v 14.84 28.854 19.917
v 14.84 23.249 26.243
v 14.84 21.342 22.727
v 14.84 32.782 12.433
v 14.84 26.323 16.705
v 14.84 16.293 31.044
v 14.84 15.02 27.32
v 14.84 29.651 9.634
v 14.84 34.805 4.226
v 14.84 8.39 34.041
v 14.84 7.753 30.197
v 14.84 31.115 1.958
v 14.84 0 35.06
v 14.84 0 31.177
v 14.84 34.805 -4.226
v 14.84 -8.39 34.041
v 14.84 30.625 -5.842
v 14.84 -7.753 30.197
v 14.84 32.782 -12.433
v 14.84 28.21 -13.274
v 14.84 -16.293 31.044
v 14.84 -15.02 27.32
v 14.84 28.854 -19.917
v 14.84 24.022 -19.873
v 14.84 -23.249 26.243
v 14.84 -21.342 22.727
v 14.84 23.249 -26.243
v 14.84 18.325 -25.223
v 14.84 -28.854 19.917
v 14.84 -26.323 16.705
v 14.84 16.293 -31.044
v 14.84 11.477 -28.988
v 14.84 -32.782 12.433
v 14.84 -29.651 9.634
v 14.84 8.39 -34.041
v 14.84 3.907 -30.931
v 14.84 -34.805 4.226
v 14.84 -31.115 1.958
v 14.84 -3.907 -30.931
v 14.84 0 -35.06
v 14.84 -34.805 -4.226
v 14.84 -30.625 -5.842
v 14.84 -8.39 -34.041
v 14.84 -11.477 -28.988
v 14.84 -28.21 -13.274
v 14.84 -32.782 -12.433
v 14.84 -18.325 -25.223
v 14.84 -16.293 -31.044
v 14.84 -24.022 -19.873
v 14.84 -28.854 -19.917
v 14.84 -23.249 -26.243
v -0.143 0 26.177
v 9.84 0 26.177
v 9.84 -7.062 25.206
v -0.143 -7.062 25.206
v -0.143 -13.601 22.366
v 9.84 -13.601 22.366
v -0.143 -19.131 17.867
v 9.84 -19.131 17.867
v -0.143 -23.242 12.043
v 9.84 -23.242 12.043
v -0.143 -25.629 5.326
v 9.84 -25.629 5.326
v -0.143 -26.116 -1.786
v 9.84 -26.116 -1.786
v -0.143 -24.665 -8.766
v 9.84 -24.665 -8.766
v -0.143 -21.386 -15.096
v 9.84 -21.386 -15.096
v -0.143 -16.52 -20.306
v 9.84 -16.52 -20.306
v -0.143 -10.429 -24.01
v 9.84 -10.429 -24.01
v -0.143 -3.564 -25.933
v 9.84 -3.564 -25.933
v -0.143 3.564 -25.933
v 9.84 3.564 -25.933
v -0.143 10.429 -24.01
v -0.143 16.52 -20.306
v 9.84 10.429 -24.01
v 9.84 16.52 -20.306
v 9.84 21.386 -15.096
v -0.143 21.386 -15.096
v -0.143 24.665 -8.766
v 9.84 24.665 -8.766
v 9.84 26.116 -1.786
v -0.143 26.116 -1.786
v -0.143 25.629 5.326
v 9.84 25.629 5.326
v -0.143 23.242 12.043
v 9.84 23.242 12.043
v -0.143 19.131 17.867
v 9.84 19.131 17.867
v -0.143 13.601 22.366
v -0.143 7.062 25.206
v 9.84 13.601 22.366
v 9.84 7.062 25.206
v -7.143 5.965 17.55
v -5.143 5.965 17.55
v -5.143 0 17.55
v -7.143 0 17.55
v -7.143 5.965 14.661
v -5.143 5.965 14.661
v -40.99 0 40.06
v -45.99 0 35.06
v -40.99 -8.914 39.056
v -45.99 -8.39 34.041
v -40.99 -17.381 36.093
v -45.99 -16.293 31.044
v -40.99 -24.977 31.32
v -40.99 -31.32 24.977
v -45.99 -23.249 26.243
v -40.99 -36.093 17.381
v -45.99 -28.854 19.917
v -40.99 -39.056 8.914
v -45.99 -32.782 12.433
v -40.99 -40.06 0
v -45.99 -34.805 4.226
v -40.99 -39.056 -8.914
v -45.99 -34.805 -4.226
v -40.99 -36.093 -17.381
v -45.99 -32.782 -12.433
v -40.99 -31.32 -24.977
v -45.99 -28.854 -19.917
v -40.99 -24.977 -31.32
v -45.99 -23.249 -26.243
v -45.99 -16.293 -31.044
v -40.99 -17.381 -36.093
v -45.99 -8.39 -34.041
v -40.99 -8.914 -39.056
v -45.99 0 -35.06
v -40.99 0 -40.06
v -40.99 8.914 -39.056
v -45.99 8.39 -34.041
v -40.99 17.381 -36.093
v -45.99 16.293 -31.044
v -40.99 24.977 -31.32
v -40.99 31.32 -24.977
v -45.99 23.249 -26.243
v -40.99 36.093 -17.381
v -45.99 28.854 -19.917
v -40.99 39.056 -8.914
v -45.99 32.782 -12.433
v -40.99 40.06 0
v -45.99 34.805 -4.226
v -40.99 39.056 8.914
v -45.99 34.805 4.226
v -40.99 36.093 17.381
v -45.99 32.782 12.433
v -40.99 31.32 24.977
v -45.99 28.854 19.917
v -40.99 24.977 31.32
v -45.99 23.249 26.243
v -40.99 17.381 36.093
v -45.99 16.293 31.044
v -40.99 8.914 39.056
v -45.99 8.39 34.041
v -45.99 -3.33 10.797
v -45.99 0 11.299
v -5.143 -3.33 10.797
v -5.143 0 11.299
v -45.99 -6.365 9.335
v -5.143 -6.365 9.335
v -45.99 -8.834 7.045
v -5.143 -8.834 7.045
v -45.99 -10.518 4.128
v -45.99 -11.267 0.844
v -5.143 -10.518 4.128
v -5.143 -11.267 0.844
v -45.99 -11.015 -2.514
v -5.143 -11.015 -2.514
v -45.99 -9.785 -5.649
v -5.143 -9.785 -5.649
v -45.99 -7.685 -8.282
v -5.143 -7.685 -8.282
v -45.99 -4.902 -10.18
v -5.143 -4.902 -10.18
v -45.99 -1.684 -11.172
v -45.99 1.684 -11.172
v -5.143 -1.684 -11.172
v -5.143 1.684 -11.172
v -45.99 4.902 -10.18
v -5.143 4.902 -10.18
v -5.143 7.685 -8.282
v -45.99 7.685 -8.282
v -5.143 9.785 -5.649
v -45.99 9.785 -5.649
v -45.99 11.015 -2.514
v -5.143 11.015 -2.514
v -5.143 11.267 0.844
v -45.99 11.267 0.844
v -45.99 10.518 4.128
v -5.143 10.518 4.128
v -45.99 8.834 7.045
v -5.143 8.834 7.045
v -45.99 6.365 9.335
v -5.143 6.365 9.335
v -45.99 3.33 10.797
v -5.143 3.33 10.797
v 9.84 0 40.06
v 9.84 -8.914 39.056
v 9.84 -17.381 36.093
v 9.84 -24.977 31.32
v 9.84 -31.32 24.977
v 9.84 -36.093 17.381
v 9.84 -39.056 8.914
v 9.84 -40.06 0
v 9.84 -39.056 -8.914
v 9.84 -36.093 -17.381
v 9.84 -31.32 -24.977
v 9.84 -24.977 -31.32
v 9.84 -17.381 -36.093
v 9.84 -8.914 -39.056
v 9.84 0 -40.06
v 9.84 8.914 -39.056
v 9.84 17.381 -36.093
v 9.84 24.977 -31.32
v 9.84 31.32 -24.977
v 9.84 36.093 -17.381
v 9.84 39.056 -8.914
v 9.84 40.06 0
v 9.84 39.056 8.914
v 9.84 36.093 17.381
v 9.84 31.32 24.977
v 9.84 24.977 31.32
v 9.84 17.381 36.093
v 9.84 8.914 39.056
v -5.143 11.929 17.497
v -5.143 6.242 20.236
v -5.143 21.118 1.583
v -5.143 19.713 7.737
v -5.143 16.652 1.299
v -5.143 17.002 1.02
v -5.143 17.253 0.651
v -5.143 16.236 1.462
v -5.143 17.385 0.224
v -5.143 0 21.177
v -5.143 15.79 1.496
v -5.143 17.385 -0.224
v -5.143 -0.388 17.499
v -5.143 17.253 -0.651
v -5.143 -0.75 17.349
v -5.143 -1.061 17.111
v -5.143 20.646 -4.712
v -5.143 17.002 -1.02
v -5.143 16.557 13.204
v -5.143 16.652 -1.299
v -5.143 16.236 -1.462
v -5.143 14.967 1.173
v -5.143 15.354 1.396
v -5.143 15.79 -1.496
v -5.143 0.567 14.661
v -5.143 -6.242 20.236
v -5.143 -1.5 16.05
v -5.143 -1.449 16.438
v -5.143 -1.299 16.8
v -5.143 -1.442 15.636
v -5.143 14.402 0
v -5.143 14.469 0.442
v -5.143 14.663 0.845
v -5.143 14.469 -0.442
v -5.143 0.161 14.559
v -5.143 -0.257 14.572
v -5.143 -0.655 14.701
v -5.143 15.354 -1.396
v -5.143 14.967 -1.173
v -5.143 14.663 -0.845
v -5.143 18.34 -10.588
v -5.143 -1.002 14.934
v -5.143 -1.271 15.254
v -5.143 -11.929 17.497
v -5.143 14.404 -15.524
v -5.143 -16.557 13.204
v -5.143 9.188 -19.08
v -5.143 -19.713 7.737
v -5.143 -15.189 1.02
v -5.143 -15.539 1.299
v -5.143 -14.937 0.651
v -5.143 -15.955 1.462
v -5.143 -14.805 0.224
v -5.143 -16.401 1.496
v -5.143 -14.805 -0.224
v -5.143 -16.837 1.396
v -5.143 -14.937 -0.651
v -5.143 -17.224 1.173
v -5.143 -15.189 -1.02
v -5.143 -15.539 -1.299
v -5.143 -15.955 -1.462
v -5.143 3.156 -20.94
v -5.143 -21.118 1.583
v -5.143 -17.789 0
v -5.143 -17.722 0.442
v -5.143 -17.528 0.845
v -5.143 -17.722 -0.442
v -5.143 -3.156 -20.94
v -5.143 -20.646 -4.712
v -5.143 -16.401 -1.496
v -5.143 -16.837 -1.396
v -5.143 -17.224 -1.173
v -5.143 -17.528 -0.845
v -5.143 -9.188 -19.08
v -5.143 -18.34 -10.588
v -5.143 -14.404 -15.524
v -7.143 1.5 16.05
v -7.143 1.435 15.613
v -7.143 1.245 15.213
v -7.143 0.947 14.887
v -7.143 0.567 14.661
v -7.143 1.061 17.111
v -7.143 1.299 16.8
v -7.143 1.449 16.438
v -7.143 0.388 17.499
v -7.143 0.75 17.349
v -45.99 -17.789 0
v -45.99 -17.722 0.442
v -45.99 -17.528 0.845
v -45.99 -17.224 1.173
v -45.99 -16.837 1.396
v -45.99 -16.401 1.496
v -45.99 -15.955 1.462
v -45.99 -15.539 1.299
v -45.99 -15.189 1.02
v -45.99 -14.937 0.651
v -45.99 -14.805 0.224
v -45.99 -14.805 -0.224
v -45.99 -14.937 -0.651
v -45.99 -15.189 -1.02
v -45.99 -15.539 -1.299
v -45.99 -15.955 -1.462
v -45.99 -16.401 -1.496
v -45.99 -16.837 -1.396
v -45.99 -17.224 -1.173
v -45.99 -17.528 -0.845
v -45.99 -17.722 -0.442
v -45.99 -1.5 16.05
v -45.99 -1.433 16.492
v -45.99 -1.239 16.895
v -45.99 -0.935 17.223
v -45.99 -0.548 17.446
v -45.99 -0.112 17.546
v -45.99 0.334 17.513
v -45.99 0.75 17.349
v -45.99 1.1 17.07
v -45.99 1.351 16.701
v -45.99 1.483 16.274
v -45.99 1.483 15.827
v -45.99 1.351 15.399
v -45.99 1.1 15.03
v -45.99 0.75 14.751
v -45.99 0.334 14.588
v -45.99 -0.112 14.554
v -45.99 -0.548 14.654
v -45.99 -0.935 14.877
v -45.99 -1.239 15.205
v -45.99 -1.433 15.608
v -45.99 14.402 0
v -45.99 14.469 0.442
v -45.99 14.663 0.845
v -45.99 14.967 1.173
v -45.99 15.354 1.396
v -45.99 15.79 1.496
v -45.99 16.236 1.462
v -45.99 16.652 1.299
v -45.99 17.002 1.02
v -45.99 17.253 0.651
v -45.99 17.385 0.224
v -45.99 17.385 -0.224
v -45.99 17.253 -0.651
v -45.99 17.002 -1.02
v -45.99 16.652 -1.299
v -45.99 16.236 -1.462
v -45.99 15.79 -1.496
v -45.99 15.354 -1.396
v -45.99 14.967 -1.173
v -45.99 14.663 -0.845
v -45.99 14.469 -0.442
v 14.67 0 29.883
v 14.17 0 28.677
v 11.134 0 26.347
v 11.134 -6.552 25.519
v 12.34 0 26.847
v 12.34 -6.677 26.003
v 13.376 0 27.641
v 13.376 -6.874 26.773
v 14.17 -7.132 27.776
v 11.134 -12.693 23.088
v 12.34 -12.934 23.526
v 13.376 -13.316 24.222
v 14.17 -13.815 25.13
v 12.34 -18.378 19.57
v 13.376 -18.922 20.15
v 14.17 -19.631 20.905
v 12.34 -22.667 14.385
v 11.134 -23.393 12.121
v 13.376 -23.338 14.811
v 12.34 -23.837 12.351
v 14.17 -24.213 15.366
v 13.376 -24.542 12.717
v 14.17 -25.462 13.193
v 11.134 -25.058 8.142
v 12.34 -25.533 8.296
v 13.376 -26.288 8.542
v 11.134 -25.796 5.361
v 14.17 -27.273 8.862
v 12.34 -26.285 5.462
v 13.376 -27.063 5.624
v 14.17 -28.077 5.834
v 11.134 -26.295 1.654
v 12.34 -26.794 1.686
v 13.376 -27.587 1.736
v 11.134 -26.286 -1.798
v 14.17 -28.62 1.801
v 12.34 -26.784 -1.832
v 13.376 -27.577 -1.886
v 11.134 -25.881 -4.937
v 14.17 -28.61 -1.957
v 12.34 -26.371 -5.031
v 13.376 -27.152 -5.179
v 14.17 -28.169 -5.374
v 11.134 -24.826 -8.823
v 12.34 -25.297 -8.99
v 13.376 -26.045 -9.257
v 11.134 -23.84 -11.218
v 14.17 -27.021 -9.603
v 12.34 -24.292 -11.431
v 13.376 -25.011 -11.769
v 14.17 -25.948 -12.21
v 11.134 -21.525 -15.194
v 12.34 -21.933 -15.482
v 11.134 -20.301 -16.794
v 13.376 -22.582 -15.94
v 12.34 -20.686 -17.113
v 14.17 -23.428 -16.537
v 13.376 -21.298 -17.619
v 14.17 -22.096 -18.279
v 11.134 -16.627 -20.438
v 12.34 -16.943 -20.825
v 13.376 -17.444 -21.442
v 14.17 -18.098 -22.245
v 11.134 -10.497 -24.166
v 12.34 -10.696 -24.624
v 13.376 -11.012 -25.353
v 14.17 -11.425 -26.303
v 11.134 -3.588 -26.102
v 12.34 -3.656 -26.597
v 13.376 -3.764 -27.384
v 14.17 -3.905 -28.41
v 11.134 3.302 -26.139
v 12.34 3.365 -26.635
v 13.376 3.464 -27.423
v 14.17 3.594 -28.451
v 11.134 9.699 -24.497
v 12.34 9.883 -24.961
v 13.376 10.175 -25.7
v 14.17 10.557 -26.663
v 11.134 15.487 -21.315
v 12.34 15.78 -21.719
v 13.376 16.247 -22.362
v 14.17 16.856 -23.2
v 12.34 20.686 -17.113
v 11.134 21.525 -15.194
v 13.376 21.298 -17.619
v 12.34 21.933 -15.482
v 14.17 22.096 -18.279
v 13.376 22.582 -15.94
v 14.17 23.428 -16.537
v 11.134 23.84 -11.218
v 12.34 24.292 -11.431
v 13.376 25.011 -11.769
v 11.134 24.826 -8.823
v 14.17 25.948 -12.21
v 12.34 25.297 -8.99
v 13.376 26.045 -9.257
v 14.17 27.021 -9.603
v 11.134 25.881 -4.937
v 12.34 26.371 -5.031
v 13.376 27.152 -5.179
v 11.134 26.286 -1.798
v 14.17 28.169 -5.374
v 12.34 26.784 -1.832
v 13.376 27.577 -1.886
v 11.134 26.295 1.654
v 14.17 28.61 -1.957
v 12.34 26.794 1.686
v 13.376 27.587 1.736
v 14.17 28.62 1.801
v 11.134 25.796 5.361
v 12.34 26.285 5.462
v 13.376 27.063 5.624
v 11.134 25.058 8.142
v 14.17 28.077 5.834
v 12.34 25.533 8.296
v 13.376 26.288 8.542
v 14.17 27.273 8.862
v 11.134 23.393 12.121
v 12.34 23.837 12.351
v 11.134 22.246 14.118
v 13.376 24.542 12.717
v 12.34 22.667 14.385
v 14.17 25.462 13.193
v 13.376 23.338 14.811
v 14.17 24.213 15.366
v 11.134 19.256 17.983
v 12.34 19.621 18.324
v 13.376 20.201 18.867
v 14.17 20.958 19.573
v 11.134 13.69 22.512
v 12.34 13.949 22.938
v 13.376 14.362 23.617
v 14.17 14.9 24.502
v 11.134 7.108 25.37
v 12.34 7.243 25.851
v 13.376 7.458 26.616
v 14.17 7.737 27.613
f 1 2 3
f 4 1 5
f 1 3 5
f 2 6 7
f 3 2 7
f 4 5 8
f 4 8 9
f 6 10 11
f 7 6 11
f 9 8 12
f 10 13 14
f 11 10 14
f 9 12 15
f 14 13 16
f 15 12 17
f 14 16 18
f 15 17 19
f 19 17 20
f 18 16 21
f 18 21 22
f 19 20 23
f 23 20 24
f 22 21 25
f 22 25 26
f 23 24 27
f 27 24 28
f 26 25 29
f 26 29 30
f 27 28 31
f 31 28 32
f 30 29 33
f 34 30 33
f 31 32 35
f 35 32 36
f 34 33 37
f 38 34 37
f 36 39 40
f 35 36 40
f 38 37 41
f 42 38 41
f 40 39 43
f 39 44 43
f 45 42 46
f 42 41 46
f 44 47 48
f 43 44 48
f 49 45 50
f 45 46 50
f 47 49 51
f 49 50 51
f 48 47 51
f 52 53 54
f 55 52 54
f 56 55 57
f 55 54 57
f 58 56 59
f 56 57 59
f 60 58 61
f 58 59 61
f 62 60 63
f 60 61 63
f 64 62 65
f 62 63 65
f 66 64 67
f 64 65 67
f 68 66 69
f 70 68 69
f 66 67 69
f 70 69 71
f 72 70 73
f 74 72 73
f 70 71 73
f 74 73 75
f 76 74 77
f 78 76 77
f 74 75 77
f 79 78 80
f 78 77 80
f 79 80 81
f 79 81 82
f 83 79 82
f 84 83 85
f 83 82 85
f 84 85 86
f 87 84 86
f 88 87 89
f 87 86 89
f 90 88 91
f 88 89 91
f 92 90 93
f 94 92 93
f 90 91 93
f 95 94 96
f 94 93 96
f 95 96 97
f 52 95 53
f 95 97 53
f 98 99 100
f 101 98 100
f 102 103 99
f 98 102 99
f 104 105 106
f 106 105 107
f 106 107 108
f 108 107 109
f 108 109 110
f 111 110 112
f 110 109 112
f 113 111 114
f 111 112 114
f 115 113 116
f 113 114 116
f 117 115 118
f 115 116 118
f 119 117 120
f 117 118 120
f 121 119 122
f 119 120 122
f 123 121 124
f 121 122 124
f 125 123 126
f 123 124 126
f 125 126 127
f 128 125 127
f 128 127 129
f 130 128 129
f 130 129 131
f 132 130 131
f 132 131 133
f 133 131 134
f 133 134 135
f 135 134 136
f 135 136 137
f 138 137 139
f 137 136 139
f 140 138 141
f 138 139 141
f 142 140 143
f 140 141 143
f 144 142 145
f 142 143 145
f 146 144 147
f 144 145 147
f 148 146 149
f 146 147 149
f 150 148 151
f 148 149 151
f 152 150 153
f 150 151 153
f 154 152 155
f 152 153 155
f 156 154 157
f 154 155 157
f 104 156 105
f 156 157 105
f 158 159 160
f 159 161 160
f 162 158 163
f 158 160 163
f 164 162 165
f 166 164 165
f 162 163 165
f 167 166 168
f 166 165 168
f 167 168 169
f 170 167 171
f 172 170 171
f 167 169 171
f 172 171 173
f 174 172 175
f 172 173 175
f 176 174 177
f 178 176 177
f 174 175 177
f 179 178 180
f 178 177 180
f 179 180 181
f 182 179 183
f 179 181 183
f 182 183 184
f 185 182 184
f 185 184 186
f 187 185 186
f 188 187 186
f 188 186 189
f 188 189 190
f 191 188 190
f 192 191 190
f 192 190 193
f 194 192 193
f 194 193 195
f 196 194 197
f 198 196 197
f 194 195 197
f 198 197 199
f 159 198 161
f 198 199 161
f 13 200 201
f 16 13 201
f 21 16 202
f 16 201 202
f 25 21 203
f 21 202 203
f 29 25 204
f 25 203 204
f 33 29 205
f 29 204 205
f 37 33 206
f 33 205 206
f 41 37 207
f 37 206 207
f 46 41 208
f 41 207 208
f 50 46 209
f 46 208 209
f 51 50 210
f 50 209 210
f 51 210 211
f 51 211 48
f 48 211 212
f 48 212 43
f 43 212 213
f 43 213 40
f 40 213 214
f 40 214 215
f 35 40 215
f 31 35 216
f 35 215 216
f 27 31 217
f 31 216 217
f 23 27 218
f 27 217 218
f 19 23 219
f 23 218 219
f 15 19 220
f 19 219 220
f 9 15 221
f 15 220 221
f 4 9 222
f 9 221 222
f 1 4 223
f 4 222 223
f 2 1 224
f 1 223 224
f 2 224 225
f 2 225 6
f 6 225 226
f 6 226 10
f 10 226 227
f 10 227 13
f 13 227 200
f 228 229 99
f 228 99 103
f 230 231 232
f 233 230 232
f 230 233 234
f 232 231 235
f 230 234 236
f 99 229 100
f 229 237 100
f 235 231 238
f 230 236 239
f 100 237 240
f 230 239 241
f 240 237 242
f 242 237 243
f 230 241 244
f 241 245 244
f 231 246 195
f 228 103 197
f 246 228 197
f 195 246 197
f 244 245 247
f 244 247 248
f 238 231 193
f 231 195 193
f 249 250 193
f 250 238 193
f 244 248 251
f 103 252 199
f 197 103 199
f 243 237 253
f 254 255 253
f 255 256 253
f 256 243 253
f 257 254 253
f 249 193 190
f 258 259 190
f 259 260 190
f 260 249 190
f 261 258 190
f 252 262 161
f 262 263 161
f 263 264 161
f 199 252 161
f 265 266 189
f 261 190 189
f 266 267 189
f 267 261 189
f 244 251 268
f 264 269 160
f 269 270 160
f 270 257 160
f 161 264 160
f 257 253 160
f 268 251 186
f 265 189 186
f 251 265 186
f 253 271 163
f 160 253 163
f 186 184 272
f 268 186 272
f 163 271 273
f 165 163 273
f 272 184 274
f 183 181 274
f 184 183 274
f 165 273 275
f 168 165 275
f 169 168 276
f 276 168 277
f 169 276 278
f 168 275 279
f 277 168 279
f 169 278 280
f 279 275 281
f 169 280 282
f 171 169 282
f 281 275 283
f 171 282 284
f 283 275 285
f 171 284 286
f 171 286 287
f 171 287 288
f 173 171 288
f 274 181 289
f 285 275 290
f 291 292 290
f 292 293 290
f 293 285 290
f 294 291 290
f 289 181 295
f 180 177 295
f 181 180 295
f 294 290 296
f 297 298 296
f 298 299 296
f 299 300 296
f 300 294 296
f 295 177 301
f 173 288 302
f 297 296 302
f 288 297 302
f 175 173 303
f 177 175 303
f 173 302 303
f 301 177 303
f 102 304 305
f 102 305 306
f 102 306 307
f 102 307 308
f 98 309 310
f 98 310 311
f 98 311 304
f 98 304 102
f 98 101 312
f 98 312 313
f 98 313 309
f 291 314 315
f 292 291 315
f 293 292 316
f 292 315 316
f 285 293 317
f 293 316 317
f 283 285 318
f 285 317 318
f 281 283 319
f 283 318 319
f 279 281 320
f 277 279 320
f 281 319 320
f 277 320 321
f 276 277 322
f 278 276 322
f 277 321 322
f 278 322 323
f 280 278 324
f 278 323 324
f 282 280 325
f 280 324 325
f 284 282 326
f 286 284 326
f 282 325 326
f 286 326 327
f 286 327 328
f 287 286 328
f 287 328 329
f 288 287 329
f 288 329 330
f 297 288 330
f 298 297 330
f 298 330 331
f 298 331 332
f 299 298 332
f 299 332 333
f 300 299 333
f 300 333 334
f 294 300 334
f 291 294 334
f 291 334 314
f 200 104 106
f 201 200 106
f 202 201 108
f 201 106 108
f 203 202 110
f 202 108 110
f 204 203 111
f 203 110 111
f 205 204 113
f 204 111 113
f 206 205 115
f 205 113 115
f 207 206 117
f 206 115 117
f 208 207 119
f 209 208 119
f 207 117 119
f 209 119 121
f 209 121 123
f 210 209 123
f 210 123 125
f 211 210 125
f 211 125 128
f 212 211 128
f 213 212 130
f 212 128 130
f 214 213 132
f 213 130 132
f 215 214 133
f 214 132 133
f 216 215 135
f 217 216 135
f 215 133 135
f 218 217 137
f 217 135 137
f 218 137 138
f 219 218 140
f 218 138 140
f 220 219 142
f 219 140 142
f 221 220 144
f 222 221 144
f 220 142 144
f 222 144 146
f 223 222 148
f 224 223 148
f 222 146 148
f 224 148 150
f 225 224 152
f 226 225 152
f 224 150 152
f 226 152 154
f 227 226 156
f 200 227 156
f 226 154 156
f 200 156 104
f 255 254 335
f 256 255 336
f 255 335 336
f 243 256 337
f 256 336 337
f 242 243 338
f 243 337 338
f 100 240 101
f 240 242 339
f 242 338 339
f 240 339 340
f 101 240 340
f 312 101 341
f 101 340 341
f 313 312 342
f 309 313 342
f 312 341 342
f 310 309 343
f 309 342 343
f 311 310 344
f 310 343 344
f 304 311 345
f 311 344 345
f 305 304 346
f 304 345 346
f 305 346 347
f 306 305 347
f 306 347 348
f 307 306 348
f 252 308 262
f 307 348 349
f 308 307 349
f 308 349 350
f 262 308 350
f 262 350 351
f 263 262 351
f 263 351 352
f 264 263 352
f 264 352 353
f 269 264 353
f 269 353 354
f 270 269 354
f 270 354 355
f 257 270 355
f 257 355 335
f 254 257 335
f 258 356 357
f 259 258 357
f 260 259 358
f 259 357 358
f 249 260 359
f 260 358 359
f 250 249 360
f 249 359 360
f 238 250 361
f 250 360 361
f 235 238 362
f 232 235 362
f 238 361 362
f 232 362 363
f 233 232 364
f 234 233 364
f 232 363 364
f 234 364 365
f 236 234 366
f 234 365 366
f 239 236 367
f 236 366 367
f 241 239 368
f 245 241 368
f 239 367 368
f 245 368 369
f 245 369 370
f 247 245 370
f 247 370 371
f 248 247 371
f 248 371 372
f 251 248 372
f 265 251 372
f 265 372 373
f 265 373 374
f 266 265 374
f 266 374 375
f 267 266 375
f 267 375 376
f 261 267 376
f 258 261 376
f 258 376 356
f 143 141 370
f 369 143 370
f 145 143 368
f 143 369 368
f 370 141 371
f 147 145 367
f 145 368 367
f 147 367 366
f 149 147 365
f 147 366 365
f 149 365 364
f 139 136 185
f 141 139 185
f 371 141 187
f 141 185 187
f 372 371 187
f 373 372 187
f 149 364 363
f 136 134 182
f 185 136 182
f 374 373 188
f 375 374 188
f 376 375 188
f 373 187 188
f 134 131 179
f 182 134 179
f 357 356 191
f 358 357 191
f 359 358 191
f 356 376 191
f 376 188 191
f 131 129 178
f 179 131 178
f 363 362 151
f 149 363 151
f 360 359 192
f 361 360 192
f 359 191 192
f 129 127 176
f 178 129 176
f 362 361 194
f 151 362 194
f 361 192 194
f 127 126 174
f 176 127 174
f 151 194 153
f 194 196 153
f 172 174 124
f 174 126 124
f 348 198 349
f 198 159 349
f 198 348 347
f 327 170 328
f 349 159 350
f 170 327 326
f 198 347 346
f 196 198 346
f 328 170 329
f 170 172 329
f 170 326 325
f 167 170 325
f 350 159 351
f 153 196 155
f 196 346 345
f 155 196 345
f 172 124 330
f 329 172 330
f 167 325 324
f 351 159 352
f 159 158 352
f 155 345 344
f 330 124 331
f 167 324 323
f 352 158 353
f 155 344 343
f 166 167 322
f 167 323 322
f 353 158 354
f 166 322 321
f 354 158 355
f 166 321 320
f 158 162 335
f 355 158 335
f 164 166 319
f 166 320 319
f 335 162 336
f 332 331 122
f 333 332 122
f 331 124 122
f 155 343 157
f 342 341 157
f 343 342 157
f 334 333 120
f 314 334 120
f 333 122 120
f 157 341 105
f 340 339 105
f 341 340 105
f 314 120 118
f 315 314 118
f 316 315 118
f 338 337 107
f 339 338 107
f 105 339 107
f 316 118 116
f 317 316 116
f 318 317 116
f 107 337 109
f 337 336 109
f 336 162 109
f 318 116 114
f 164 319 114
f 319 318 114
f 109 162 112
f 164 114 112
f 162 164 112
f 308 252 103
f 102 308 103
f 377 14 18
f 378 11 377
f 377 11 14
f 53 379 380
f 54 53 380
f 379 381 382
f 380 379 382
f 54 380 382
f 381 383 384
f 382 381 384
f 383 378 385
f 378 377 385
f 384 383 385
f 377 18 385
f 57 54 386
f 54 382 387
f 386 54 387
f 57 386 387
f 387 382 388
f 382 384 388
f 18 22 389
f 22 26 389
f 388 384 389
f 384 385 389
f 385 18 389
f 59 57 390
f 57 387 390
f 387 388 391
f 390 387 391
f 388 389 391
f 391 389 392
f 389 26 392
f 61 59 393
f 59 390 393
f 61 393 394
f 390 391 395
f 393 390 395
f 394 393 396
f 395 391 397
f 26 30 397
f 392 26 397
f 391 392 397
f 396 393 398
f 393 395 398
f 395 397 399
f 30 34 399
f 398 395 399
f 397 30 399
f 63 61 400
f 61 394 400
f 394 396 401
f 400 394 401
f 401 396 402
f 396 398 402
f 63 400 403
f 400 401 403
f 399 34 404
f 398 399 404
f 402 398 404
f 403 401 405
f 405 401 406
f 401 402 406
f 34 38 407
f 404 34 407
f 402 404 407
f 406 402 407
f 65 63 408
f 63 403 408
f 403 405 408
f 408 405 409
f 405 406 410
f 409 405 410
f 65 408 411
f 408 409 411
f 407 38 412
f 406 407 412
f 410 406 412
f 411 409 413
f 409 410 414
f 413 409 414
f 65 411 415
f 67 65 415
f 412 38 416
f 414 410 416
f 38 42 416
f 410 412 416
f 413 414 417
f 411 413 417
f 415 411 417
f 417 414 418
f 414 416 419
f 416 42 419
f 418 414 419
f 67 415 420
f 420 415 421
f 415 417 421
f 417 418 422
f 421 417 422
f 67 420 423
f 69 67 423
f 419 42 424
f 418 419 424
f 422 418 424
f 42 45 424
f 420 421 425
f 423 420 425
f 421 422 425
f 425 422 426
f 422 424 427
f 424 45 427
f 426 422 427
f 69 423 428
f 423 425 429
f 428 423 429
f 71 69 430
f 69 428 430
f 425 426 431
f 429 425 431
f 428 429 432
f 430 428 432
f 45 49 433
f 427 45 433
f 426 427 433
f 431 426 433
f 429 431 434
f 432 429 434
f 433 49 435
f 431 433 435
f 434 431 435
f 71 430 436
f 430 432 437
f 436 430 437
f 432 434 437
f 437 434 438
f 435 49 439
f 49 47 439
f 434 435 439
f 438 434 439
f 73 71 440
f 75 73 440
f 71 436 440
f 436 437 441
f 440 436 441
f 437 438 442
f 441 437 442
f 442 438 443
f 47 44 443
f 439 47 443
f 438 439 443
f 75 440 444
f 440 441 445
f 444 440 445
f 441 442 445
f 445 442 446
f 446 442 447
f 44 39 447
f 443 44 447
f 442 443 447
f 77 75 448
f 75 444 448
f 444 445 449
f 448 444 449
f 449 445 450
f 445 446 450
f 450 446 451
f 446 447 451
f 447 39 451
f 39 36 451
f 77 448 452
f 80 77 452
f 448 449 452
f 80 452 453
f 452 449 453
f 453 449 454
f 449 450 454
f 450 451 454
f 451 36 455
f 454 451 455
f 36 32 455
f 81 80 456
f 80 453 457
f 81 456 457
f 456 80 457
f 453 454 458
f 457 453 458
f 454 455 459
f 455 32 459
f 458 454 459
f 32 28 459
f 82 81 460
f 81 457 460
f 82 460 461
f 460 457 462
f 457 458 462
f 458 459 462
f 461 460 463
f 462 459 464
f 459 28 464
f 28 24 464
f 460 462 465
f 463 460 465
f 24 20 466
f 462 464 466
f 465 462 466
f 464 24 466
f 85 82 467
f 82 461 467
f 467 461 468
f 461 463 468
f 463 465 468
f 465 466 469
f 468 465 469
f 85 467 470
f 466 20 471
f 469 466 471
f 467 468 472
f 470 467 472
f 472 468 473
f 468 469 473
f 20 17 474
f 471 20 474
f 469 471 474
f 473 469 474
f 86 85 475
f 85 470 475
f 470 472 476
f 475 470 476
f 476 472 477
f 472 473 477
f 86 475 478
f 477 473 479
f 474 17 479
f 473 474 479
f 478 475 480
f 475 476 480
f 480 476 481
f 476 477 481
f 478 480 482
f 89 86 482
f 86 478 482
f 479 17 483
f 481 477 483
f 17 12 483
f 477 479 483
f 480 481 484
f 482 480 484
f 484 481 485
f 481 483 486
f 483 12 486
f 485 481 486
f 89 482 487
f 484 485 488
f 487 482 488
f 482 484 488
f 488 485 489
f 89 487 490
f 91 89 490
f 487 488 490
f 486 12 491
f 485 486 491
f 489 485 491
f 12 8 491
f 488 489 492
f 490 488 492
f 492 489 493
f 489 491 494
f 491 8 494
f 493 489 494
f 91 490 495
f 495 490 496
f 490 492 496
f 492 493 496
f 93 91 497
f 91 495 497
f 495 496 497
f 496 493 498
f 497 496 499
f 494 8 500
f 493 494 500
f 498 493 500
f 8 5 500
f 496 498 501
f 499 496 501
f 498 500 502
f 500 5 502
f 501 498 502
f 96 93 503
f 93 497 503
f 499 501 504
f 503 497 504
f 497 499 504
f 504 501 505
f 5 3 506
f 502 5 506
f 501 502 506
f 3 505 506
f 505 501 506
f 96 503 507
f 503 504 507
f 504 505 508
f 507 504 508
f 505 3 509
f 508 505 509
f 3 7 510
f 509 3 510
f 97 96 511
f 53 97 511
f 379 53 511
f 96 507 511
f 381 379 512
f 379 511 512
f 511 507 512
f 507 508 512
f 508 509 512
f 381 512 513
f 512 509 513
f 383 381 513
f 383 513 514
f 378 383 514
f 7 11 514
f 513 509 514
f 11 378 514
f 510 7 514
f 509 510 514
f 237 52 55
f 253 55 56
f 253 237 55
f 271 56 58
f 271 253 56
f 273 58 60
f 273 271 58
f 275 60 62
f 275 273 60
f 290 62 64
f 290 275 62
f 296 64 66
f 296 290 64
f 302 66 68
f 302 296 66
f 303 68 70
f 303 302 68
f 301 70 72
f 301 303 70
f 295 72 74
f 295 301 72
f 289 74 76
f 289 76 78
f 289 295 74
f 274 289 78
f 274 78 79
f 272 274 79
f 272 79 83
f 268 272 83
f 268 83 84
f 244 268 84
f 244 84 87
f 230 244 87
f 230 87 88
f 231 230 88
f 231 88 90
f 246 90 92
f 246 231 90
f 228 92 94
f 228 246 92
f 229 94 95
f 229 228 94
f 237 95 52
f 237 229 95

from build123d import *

# Parameters (mm, degrees)
F0_W      = 19.9827682227
F0_H      = 13.8834062964
F2_R      = 5
F3_SIZE   = 5
F5_D      = 3
F7_D      = 3
F9_D      = 3
F11_DEPTH = 2


with BuildPart() as f1:
    # F0 (on Front) → F1 (revolve)
    with BuildSketch(Plane.XZ):
        Polygon((-5.1426226273, 40.0602705777), (-45.9897518158, 40.0602705777), (-45.9897518158, 11.2985512242), (-5.1426226273, 11.2985512242), (-5.1426226273, 26.1768642813), align=None)
        with Locations((4.848761484, 33.1185674295)):
            Rectangle(F0_W, F0_H)
    revolve(axis=Axis((-8.3751268685, 0, 0), (1, 0, 0)))

    # F2
    f2_edges = [f1.edges().sort_by_distance(p)[0] for p in [
        (14.840146, 0, -26.176864),
    ]]
    fillet(f2_edges, radius=F2_R)

    # F3
    f3_edges = [f1.edges().sort_by_distance(p)[0] for p in [
        (-5.142623, 0, -26.176864),
        (14.840146, 0, -40.060271),
        (-45.989752, 0, -40.060271),
        (-15.574803, 0, 40.060271),
    ]]
    chamfer(f3_edges, length=F3_SIZE)

    # F5 (through all)
    with Locations(Plane.YZ.offset(-5.1426226273)):
        with Locations((-16.2885512242, 0)):
            Hole(F5_D / 2)

    # F7 (through all)
    with Locations(Plane.YZ.offset(-5.1426226273)):
        with Locations((15.9020125866, 0)):
            Hole(F7_D / 2)

    # F9 (through all)
    with Locations(Plane.YZ.offset(-5.1426226273)):
        with Locations((0, 16.050176695)):
            Hole(F9_D / 2)

    # F10 (on face) → F11 (cut)
    with BuildSketch(Plane.YZ.offset(-5.1426226273)):
        with BuildLine():
            Line((5.9653543867, 17.550176695), (0, 17.550176695))
            ThreePointArc((0, 17.550176695), (1.0606601718, 17.1108368668), (1.5, 16.050176695))
            ThreePointArc((1.5, 16.050176695), (1.2449620199, 15.2134750941), (0.5665739081, 14.6612944081))
            Line((0.5665739081, 14.6612944081), (5.9653543867, 14.6612944081))
            Line((5.9653543867, 14.6612944081), (5.9653543867, 17.550176695))
        make_face()
    extrude(amount=-F11_DEPTH, mode=Mode.SUBTRACT)


solid = f1.part
